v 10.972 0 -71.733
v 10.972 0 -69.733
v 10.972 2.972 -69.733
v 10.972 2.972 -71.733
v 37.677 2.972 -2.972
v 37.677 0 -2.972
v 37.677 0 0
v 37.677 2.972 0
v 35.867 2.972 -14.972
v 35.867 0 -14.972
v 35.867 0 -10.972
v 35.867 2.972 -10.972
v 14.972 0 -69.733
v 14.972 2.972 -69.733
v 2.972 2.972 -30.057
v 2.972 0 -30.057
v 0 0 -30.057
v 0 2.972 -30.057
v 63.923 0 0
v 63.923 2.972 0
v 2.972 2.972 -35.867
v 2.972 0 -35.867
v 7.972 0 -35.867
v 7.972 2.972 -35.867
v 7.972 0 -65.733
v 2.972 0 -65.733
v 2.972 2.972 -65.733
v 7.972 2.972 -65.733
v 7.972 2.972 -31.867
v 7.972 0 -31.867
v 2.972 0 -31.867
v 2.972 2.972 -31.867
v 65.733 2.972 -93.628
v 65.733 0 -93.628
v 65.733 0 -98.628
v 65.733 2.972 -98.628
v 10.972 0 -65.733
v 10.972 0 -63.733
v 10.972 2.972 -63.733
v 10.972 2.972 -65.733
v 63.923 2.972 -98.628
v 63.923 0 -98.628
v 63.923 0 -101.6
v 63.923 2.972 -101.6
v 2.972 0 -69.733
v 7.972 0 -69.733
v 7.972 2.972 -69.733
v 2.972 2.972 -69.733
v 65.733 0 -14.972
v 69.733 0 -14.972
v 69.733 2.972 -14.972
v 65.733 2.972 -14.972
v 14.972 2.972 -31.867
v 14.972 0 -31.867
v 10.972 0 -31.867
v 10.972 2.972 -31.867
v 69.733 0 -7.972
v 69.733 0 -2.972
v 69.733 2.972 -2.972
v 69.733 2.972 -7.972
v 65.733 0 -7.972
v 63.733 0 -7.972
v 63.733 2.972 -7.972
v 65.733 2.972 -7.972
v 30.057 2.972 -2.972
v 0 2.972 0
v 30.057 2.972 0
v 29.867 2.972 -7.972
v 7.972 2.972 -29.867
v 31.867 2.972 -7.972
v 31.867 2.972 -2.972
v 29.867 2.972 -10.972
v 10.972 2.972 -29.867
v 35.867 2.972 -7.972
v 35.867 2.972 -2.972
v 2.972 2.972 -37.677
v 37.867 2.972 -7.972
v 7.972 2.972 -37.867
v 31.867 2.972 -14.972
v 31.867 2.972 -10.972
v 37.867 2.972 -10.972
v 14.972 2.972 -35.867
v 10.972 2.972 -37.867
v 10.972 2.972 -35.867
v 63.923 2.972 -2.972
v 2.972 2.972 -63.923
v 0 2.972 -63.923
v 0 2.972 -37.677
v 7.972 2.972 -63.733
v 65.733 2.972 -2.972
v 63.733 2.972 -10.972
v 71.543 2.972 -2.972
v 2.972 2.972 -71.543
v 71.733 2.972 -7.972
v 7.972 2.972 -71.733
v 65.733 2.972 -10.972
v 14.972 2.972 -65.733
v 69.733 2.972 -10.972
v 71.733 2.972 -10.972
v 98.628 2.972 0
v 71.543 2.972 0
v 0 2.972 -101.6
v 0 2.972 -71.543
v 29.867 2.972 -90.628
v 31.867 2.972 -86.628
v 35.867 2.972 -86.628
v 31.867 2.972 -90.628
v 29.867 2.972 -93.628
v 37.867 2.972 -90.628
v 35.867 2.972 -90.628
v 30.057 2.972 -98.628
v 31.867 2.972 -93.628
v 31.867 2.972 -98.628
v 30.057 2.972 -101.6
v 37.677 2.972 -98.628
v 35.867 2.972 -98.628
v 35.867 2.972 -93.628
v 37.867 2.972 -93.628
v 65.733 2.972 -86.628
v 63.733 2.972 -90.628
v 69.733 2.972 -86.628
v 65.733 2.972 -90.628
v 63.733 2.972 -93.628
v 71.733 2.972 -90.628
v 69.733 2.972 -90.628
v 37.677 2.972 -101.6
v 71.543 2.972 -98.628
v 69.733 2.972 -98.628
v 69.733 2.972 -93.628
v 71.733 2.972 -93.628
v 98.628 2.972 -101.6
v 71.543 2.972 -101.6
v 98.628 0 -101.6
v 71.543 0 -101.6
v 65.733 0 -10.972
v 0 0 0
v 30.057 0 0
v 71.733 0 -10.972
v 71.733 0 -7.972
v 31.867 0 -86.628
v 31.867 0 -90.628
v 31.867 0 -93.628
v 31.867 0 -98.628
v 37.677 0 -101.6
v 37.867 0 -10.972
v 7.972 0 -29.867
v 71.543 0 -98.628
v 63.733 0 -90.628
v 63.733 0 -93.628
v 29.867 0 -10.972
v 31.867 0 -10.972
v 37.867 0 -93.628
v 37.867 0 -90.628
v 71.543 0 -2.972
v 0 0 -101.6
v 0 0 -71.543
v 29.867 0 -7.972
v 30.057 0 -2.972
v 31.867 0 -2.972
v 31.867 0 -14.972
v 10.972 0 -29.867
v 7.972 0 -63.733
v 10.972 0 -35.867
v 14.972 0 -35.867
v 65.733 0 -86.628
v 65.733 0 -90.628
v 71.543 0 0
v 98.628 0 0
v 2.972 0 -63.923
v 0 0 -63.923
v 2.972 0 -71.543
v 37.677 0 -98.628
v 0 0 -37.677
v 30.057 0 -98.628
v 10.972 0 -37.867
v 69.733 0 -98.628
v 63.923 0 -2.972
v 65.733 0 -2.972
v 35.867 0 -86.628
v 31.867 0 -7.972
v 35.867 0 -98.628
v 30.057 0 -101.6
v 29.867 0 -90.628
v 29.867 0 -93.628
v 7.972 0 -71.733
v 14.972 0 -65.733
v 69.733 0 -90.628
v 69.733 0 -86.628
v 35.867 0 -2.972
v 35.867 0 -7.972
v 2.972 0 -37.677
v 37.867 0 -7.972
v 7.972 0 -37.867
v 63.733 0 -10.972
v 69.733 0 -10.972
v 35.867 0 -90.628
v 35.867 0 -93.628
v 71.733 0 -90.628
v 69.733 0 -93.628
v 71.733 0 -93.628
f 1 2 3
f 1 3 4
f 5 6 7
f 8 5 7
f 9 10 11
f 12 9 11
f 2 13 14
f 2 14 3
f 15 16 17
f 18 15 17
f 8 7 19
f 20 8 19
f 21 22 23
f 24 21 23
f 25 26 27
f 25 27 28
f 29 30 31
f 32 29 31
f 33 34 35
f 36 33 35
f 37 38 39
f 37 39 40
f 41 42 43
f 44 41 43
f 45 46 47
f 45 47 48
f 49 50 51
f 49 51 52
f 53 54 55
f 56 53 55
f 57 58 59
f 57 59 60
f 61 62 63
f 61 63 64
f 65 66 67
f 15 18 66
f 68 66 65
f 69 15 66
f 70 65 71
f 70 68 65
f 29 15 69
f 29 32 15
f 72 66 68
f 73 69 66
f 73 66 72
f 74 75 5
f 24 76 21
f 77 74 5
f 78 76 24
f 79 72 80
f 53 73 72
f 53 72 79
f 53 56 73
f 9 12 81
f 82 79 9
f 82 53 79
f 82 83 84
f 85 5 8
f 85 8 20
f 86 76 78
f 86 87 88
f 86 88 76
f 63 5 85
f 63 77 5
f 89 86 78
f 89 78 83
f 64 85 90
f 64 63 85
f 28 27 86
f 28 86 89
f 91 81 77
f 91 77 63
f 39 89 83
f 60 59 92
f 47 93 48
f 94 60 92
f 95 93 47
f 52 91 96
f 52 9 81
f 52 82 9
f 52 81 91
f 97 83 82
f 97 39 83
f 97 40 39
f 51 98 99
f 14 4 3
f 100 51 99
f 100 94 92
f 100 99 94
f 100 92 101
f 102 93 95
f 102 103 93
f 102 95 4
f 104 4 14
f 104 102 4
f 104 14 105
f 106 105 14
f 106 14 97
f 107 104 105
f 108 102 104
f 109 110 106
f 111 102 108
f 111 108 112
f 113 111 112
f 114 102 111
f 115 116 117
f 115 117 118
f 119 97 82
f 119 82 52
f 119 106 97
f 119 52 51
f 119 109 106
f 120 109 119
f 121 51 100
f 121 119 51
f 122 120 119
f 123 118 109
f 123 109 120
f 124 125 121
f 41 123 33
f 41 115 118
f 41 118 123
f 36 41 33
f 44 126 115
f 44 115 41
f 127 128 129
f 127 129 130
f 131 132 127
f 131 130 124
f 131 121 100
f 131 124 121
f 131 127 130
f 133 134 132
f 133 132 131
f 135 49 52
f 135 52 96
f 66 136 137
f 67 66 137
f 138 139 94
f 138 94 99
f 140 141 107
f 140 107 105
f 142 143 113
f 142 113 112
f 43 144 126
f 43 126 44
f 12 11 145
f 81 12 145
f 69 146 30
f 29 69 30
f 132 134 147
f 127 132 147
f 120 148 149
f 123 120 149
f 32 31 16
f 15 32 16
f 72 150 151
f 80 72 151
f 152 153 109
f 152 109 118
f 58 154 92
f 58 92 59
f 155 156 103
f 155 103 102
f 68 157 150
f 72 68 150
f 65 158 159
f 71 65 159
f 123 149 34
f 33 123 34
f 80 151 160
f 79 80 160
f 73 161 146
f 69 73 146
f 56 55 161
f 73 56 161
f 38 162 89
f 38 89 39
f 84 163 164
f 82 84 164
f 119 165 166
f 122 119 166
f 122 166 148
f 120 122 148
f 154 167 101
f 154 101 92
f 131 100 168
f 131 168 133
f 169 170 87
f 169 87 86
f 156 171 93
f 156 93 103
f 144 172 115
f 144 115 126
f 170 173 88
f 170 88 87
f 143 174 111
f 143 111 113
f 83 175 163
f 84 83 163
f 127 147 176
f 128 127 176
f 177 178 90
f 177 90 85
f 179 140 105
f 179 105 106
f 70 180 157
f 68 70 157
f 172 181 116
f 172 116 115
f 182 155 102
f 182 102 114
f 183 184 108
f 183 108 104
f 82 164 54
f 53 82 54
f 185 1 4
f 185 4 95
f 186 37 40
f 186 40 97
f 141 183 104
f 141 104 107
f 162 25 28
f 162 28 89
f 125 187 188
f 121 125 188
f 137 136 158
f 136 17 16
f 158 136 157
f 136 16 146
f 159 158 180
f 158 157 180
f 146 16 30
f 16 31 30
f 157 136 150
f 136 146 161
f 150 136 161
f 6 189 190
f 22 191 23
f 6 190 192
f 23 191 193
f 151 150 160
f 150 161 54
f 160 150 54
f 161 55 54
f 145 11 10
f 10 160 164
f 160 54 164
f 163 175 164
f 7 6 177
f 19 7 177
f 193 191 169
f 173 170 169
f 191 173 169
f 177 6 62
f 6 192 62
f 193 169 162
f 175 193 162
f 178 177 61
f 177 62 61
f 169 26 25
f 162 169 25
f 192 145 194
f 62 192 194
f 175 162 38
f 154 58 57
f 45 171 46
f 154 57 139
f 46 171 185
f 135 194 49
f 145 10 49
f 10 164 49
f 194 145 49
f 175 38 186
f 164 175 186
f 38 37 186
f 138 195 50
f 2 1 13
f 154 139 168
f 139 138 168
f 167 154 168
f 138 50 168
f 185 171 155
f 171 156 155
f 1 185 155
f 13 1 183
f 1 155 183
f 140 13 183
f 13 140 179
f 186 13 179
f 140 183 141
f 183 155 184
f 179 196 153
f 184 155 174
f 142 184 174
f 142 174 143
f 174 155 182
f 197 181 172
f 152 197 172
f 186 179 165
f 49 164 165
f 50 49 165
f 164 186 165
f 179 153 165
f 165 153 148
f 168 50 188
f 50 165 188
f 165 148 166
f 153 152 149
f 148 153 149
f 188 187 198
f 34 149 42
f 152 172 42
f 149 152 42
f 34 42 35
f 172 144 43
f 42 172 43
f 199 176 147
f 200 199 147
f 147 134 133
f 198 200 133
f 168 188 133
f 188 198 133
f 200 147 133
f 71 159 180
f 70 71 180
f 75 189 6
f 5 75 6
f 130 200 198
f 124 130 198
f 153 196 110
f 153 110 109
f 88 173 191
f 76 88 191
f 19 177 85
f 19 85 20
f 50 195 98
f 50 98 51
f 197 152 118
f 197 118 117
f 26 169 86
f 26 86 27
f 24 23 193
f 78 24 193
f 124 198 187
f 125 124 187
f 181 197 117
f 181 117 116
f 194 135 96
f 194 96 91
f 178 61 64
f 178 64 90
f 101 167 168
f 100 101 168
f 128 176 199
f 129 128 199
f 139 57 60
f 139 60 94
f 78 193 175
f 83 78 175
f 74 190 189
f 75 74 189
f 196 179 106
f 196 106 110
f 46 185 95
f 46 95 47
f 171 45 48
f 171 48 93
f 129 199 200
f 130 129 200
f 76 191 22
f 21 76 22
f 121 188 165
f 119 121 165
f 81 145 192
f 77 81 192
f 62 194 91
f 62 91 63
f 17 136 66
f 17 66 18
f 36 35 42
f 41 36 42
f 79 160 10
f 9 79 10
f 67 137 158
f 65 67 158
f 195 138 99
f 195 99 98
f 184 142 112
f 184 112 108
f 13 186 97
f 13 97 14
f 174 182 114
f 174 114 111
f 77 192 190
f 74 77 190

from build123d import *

# Parameters (mm, degrees)
SKETCH_1_W            = 101.6
SKETCH_1_H            = 101.6
EXTRUDE_1_DEPTH       = 2.9718
CUT_EXTRUDE_1_DEPTH   = 144.714827333
MIRROR_2_COPY_1_DEPTH = 144.714827333
CUT_EXTRUDE_3_DEPTH   = 144.714827333
SKETCH_2_W            = 101.6
SKETCH_2_H            = 2.9718
CUT_EXTRUDE_4_DEPTH   = 2.9718


with BuildPart() as part:
    # 草图1 → 凸台-拉伸1 (new body)
    with BuildSketch(Plane(origin=(0, 0, 0), x_dir=(1, 0, 0), z_dir=(0, 1, 0))):
        with Locations((50.8, 50.8)):
            Rectangle(SKETCH_1_W, SKETCH_1_H)
    extrude(amount=EXTRUDE_1_DEPTH)

    # 草图1<3> → 切除-拉伸1 (cut, through all)
    with BuildSketch(Plane(origin=(0, 0, 0), x_dir=(1, 0, 0), z_dir=(0, 1, 0))):
        Polygon((37.676666667, 98.6282), (37.676666667, 101.6), (30.056666667, 101.6), (30.056666667, 98.6282), (31.866666667, 98.6282), (31.866666667, 93.6282), (29.866666667, 93.6282), (29.866666667, 90.6282), (31.866666667, 90.6282), (31.866666667, 86.6282), (35.866666667, 86.6282), (35.866666667, 90.6282), (37.866666667, 90.6282), (37.866666667, 93.6282), (35.866666667, 93.6282), (35.866666667, 98.6282), align=None)
    cut_extrude_1 = extrude(amount=CUT_EXTRUDE_1_DEPTH, mode=Mode.SUBTRACT)

    # 镜向1: 切除-拉伸1 across plane
    add(cut_extrude_1.mirror(Plane(origin=(0, 0, -50.8), x_dir=(1, 0, 0), z_dir=(0, 0, -1))), mode=Mode.SUBTRACT)

    # 镜向2: 切除-拉伸1 across plane
    add(cut_extrude_1.mirror(Plane(origin=(50.8, 0, 0), x_dir=(0, 0, 1), z_dir=(1, 0, 0))), mode=Mode.SUBTRACT)

    # 镜向2 copy 1 sketch → 镜向2 copy 1 (cut, through all)
    with BuildSketch(Plane(origin=(101.6, 0, -101.6), x_dir=(-1, 0, 0), z_dir=(0, 1, 0))):
        Polygon((37.676666667, 98.6282), (37.676666667, 101.6), (30.056666667, 101.6), (30.056666667, 98.6282), (31.866666667, 98.6282), (31.866666667, 93.6282), (29.866666667, 93.6282), (29.866666667, 90.6282), (31.866666667, 90.6282), (31.866666667, 86.6282), (35.866666667, 86.6282), (35.866666667, 90.6282), (37.866666667, 90.6282), (37.866666667, 93.6282), (35.866666667, 93.6282), (35.866666667, 98.6282), align=None)
    extrude(amount=MIRROR_2_COPY_1_DEPTH, mode=Mode.SUBTRACT)

    # 草图1<4> → 切除-拉伸3 (cut, through all)
    with BuildSketch(Plane(origin=(0, 0, 0), x_dir=(1, 0, 0), z_dir=(0, 1, 0))):
        Polygon((0, 71.543333333), (0, 63.923333333), (2.9718, 63.923333333), (2.9718, 65.733333333), (7.9718, 65.733333333), (7.9718, 63.733333333), (10.9718, 63.733333333), (10.9718, 65.733333333), (14.9718, 65.733333333), (14.9718, 69.733333333), (10.9718, 69.733333333), (10.9718, 71.733333333), (7.9718, 71.733333333), (7.9718, 69.733333333), (2.9718, 69.733333333), (2.9718, 71.543333333), align=None)
    cut_extrude_3 = extrude(amount=CUT_EXTRUDE_3_DEPTH, mode=Mode.SUBTRACT)

    # 镜向3: 切除-拉伸3 across plane
    add(cut_extrude_3.mirror(Plane(origin=(0, 0, -50.8), x_dir=(1, 0, 0), z_dir=(0, 0, -1))), mode=Mode.SUBTRACT)

    # 草图2 → 切除-拉伸4 (cut)
    with BuildSketch(Plane(origin=(101.6, 0, 0), x_dir=(0, 0, -1), z_dir=(1, 0, 0))):
        with Locations((50.8, 1.4859)):
            Rectangle(SKETCH_2_W, SKETCH_2_H)
    extrude(amount=-CUT_EXTRUDE_4_DEPTH, mode=Mode.SUBTRACT)


solid = part.part
